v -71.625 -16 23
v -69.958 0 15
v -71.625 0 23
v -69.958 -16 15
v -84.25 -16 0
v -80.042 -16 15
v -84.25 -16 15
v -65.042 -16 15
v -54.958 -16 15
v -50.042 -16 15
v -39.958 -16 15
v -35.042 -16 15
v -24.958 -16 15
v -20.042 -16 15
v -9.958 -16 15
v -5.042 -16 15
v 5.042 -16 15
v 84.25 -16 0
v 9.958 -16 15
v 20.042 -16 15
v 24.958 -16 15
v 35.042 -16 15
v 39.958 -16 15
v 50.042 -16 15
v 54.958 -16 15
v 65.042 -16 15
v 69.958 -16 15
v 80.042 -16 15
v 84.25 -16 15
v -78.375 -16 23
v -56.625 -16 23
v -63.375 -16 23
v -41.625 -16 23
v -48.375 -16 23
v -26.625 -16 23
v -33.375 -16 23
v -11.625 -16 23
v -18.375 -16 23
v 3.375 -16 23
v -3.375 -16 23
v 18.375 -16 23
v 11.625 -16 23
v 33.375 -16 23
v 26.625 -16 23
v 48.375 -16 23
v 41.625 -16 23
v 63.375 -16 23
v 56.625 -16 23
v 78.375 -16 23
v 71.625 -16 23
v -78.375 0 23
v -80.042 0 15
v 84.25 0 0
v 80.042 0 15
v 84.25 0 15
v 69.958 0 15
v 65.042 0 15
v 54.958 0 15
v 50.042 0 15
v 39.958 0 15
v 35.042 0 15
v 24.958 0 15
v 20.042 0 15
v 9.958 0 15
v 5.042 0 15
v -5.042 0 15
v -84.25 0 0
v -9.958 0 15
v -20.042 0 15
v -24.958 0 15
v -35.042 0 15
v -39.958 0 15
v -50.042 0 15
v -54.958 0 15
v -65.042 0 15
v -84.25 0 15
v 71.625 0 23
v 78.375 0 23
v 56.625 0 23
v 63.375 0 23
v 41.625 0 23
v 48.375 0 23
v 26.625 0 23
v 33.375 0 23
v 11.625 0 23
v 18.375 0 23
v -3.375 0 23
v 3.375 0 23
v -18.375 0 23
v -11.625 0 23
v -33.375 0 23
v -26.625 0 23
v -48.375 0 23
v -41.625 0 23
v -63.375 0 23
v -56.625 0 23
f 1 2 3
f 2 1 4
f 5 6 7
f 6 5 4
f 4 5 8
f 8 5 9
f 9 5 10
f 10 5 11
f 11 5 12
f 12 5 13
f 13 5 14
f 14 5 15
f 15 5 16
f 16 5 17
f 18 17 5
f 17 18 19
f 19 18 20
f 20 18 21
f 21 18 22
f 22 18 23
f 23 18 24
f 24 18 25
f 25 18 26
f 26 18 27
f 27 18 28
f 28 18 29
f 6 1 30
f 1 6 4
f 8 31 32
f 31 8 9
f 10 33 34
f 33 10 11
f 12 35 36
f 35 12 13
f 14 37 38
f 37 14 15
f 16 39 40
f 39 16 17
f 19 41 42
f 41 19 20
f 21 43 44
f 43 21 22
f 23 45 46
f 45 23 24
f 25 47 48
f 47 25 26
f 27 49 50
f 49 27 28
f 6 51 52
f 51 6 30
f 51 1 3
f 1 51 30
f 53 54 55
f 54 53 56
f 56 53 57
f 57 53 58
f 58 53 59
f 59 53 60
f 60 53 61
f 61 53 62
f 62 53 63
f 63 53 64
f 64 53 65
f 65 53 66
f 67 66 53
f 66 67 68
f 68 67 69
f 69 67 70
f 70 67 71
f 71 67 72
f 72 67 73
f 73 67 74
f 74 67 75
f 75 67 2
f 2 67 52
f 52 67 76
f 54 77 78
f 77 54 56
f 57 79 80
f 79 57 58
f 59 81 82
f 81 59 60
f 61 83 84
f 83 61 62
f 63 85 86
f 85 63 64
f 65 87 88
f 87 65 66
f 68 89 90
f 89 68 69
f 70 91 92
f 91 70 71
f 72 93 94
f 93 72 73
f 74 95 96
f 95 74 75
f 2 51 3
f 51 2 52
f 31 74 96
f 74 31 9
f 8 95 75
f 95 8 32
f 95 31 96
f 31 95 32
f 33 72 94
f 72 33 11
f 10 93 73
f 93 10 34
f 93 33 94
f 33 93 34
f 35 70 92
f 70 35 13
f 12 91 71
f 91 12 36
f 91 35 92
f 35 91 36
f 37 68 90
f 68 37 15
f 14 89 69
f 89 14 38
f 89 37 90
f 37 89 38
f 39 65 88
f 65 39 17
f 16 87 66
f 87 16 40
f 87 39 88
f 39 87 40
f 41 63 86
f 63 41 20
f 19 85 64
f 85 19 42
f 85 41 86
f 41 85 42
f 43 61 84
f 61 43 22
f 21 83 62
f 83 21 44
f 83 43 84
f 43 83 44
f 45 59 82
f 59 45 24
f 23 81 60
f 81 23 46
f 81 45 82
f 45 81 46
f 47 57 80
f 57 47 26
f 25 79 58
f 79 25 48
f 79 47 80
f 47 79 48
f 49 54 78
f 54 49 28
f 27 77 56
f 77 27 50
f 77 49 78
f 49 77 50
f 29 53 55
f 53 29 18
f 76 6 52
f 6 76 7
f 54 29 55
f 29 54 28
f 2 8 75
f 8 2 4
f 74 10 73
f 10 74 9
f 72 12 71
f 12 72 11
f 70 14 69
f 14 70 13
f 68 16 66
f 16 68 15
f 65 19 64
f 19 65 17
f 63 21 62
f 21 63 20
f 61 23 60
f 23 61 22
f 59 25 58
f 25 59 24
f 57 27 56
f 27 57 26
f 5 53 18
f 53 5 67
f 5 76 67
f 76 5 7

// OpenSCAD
$fn = 32;

// ----------------------------------------------------------------------
// Toothed rack, 11 teeth
// 15 mm pitch, 8 mm teeth
// ----------------------------------------------------------------------

// --- parameters (mm) ---
bar_w = 16;      // bar width (Y)
bar_h = 15;      // bar height (Z)
teeth = 11;      // number of teeth
pitch = 15;      // tooth pitch
tooth_h = 8;     // tooth height above the bar
root_w = 10.5;   // tooth width at the root
crest_w = 6.75;  // tooth width at the crest

// --- derived feature positions (mm) ---
span = (teeth - 1) * pitch;  // = 150   distance between the outer teeth
bar_l = span + root_w + 8;   // = 168.5   bar length: teeth plus 4 mm at each end
tooth_x = -span / 2;         // = -75   X of the first tooth
height = bar_h + tooth_h;    // = 23   overall height
feature_centers = [
  [tooth_x + 0 * pitch, -bar_w / 2],
  [tooth_x + 1 * pitch, -bar_w / 2],
  [tooth_x + 2 * pitch, -bar_w / 2],
  [tooth_x + 3 * pitch, -bar_w / 2],
  [tooth_x + 4 * pitch, -bar_w / 2],
  [tooth_x + 5 * pitch, -bar_w / 2],
  [tooth_x + 6 * pitch, -bar_w / 2],
  [tooth_x + 7 * pitch, -bar_w / 2],
  [tooth_x + 8 * pitch, -bar_w / 2],
  [tooth_x + 9 * pitch, -bar_w / 2],
  [tooth_x + 10 * pitch, -bar_w / 2]
];   // tooth centre line, drives the tooth loop

// bar with a rack of teeth, one extruded trapezoium per centre
module rack_tooth() {
  linear_extrude(height = bar_w)
    polygon(points = [
      [0, 0],
      [root_w, 0],
      [root_w / 2 + crest_w / 2, tooth_h + 1],
      [root_w / 2 - crest_w / 2, tooth_h + 1]
    ]);
}

union() {
  translate([-bar_l / 2, -bar_w, 0]) cube([bar_l, bar_w, bar_h]);
  for (centre = feature_centers)
    translate([centre[0] - root_w / 2, 0, bar_h - 1]) rotate([90, 0, 0]) rack_tooth();
}
